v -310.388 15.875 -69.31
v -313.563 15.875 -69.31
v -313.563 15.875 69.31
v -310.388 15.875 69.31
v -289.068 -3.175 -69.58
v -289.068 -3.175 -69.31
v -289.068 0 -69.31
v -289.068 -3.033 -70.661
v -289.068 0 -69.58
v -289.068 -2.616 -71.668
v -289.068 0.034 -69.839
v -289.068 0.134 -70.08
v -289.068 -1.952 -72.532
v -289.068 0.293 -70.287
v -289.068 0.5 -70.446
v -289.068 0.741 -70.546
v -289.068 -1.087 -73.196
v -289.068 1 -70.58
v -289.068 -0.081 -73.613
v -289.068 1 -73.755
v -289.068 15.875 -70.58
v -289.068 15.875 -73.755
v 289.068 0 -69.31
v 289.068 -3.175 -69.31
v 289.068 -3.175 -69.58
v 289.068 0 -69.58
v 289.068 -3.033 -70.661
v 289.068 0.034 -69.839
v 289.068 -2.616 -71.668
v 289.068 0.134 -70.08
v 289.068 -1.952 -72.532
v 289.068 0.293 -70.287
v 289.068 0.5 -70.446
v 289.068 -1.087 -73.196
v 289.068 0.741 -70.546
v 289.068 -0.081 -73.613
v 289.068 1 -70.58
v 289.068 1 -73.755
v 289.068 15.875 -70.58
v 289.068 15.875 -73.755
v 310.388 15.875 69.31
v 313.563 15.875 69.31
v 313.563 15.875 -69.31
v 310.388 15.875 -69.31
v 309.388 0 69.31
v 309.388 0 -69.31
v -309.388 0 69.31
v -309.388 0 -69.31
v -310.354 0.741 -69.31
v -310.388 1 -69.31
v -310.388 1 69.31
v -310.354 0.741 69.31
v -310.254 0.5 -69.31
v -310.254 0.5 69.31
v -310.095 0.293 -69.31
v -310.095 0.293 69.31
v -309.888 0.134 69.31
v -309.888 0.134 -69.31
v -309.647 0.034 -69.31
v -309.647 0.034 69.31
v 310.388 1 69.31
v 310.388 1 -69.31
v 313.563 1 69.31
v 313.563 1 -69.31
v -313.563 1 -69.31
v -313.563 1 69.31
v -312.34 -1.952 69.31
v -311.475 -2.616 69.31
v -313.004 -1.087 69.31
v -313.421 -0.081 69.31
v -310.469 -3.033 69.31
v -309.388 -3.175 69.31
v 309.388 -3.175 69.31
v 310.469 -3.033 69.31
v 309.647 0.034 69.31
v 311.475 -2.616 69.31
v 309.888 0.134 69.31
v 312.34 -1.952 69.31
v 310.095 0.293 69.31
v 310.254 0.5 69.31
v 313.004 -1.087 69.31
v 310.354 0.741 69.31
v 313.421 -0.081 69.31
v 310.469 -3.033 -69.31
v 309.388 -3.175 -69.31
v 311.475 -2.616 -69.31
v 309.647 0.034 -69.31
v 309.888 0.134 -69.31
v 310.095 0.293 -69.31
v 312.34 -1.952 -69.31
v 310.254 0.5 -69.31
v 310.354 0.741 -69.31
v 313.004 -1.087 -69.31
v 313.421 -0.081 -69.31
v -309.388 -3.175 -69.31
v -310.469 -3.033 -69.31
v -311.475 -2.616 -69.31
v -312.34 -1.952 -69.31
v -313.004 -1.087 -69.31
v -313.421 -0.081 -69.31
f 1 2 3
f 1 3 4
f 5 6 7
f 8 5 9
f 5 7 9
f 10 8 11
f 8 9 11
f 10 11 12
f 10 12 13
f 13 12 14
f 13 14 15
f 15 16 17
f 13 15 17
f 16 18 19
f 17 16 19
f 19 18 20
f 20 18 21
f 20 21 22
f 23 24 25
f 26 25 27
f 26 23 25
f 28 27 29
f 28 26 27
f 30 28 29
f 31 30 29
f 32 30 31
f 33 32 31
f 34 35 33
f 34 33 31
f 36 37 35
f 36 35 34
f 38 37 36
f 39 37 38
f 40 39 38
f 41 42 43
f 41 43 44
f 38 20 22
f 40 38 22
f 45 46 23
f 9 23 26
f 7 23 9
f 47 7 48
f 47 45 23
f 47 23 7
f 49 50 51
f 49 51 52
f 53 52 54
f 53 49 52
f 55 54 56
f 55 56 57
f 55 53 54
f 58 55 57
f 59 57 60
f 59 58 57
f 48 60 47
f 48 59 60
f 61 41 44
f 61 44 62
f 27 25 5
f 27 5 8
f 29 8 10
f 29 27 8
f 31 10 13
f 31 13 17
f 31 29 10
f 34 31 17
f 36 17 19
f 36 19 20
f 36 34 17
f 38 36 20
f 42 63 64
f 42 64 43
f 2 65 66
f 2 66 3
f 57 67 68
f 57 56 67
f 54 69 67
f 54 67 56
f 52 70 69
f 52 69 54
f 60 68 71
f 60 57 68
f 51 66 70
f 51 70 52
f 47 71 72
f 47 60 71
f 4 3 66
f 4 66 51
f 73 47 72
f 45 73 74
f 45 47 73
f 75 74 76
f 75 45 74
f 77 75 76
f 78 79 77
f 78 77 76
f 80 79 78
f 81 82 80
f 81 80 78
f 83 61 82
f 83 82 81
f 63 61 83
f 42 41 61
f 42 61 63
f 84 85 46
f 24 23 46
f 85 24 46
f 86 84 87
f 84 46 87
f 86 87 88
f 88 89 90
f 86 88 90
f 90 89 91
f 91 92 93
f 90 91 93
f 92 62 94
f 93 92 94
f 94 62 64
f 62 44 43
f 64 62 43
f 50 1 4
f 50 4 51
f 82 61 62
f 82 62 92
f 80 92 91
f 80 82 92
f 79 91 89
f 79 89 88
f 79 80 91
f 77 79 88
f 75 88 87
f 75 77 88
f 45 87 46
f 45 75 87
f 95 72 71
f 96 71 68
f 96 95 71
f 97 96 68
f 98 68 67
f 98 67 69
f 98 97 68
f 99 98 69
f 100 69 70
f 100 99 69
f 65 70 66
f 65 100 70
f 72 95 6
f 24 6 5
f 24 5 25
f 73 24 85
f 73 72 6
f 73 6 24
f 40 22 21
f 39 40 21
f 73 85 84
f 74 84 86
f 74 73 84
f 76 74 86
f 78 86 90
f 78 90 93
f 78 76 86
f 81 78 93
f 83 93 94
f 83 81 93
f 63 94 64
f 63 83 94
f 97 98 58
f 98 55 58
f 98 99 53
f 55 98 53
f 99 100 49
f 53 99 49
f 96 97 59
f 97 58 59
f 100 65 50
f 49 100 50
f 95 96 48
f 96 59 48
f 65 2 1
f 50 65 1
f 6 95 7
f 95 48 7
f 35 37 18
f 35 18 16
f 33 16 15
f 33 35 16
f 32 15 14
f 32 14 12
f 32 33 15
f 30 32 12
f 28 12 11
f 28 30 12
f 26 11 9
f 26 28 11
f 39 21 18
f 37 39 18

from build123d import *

# Parameters (mm, degrees)
SKETCH1_W               = 614.68
SKETCH1_H               = 138.6205
BASE_FLANGE1_DEPTH      = 3.175
EDGE_FLANGE1_DEPTH      = 138.6205
EDGE_FLANGE1_BEND_DEPTH = 138.6205
EDGE_FLANGE2_DEPTH      = 578.136


# Sheet-metal steps are written as plain solids
with BuildPart() as part:
    # Sketch1 → Base-Flange1 (new body)
    with BuildSketch(Plane(origin=(0, 0, 0), x_dir=(1, 0, 0), z_dir=(0, 1, 0))):
        Rectangle(SKETCH1_W, SKETCH1_H)
    extrude(amount=-BASE_FLANGE1_DEPTH)

    # Edge-Flange1 section (across the edge) → Edge-Flange1 (add)
    with BuildSketch(Plane(origin=(-310.388, 0, -69.31025), x_dir=(1, 0, 0), z_dir=(0, 0, 1))):
        with BuildLine():
            Line((-3.175, 1), (-3.175, 15.875))
            Line((-3.175, 15.875), (0, 15.875))
            Line((0, 15.875), (0, 1))
            ThreePointArc((0, 1), (0.292893219, 0.292893219), (1, 0))
            Line((1, 0), (3.048, 0))
            Line((3.048, 0), (3.048, -3.175))
            Line((3.048, -3.175), (1, -3.175))
            ThreePointArc((1, -3.175), (-1.952170811, -1.952170811), (-3.175, 1))
        make_face()
    extrude(amount=EDGE_FLANGE1_DEPTH)

    # Edge-Flange1 section 2 (across the edge) → Edge-Flange1 bend (add)
    with BuildSketch(Plane(origin=(310.388, 0, 69.31025), x_dir=(-1, 0, 0), z_dir=(0, 0, -1))):
        with BuildLine():
            Line((-3.175, 1), (-3.175, 15.875))
            Line((-3.175, 15.875), (0, 15.875))
            Line((0, 15.875), (0, 1))
            ThreePointArc((0, 1), (0.292893219, 0.292893219), (1, 0))
            Line((1, 0), (3.048, 0))
            Line((3.048, 0), (3.048, -3.175))
            Line((3.048, -3.175), (1, -3.175))
            ThreePointArc((1, -3.175), (-1.952170811, -1.952170811), (-3.175, 1))
        make_face()
    extrude(amount=EDGE_FLANGE1_BEND_DEPTH)

    # Edge-Flange2 section (across the edge) → Edge-Flange2 (add)
    with BuildSketch(Plane(origin=(289.068, 0, -70.58025), x_dir=(0, 0, 1), z_dir=(-1, 0, 0))):
        with BuildLine():
            Line((-3.175, 1), (-3.175, 15.875))
            Line((-3.175, 15.875), (0, 15.875))
            Line((0, 15.875), (0, 1))
            ThreePointArc((0, 1), (0.292893219, 0.292893219), (1, 0))
            Line((1, 0), (1.27, 0))
            Line((1.27, 0), (1.27, -3.175))
            Line((1.27, -3.175), (1, -3.175))
            ThreePointArc((1, -3.175), (-1.952170811, -1.952170811), (-3.175, 1))
        make_face()
    extrude(amount=EDGE_FLANGE2_DEPTH)


solid = part.part
